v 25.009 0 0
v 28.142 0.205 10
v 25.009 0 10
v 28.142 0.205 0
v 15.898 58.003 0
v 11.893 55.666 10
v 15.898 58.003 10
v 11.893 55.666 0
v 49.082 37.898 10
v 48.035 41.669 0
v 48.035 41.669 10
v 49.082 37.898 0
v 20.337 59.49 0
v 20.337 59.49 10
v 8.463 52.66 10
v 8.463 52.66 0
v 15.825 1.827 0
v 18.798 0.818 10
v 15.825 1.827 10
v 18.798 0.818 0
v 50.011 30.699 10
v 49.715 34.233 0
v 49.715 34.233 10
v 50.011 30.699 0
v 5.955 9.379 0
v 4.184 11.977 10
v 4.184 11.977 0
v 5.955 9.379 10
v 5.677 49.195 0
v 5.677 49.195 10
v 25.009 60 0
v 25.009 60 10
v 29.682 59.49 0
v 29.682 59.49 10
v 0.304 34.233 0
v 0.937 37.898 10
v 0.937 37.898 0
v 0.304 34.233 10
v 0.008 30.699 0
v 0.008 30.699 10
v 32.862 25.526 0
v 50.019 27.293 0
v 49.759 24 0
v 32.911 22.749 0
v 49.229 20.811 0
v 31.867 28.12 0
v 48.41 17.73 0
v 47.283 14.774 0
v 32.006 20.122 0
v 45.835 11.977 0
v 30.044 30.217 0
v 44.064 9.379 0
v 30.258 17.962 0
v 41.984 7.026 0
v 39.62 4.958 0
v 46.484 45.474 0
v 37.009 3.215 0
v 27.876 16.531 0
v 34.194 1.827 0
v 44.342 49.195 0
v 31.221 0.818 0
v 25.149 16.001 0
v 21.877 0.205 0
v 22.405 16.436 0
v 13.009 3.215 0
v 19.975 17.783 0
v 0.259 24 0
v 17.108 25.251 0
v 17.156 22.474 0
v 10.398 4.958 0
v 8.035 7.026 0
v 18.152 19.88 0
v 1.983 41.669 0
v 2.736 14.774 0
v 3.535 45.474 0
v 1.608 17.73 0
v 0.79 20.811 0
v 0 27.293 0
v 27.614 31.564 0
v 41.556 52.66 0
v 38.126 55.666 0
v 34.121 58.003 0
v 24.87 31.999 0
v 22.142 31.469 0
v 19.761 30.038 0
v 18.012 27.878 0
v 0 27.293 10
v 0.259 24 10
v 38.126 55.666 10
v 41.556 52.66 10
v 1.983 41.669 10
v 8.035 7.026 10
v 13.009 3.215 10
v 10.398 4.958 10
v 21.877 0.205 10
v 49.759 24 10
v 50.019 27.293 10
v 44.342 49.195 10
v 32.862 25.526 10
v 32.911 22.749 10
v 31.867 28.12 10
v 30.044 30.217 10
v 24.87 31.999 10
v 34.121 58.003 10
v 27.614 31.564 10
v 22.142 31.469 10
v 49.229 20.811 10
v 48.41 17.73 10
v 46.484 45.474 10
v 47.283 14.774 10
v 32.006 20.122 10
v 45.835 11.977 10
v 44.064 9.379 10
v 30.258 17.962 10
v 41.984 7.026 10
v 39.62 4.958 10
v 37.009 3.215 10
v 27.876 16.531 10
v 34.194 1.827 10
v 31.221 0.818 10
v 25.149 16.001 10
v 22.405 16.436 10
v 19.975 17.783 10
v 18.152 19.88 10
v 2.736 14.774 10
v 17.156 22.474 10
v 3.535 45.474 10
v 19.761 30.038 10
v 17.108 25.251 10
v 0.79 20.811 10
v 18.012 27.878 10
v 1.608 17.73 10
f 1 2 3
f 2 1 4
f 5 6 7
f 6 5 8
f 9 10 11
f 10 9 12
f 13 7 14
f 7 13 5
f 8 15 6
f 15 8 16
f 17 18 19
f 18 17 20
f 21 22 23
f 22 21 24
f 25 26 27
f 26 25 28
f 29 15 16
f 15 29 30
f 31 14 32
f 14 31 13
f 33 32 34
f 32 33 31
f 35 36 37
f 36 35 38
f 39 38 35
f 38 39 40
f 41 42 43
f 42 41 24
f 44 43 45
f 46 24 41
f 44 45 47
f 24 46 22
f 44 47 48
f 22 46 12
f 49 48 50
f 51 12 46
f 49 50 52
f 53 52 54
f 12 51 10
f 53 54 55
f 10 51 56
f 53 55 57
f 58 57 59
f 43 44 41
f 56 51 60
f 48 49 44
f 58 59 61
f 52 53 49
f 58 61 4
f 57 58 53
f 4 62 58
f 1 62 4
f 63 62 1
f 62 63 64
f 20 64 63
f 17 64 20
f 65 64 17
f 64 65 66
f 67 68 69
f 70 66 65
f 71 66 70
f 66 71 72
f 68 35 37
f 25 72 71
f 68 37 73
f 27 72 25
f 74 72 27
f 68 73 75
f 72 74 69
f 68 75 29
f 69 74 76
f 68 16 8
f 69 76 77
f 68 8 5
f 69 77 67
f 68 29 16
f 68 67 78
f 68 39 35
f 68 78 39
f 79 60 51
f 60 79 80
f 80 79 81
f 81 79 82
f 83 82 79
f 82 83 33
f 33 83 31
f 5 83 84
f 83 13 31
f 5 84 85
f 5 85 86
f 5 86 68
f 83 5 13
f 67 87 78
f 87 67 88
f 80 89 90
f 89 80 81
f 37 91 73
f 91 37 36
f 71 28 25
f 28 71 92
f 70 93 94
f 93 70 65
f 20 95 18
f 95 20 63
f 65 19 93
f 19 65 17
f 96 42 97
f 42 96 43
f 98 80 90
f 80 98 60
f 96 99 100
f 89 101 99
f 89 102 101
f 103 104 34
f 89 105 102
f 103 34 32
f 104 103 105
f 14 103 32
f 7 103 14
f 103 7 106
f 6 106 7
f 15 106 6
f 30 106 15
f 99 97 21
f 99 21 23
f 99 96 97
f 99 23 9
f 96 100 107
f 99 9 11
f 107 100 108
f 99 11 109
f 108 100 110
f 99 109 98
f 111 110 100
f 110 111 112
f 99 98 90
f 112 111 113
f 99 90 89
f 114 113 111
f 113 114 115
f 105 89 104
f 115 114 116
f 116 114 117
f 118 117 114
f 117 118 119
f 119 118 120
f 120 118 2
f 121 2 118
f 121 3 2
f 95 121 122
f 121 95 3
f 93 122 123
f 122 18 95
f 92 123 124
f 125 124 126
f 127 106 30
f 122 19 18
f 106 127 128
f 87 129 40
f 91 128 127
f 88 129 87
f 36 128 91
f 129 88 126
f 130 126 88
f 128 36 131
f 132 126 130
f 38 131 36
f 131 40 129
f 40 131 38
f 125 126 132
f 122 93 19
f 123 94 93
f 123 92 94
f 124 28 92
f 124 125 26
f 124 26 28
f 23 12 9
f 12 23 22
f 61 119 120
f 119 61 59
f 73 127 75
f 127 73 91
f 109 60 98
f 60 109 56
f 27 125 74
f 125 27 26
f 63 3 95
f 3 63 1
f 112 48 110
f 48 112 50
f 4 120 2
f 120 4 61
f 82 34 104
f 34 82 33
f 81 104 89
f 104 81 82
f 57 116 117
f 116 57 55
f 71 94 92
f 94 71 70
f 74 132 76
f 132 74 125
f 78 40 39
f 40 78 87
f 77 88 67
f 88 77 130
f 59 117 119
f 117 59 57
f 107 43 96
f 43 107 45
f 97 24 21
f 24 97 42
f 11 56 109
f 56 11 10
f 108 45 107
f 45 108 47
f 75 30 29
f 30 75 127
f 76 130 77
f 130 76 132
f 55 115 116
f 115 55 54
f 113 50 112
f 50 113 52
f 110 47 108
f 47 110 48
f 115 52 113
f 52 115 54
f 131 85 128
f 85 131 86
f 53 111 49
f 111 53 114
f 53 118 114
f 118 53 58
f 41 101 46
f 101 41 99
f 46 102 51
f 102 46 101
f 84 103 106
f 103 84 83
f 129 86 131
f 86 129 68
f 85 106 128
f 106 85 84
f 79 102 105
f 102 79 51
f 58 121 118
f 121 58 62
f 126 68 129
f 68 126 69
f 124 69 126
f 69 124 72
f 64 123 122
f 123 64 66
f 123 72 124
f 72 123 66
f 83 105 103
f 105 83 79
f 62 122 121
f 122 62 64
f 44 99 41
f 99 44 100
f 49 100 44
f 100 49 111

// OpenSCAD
$fn = 32;

// ----------------------------------------------------------------------
// Cam plate: single_lobe cam, base R24
// ----------------------------------------------------------------------

// --- parameters (mm) ---
base_r = 24;              // base circle radius
lobe_h = 12;              // cam lobe rise
bore_r = 8;               // shaft bore radius
plate_t = 10;             // plate thickness, Z (extrusion height)

profile = [[49.759, 24], [50.019, 27.293], [50.011, 30.699], [49.715, 34.233], [49.082, 37.898], [48.035, 41.669], [46.484, 45.474], [44.342, 49.195], [41.556, 52.66], [38.126, 55.666], [34.121, 58.003], [29.682, 59.49], [25.009, 60], [20.337, 59.49], [15.898, 58.003], [11.893, 55.666], [8.463, 52.66], [5.677, 49.195], [3.535, 45.474], [1.983, 41.669], [0.937, 37.898], [0.304, 34.233], [0.008, 30.699], [0, 27.293], [0.259, 24], [0.79, 20.811], [1.608, 17.73], [2.736, 14.774], [4.184, 11.977], [5.955, 9.379], [8.035, 7.026], [10.398, 4.958], [13.009, 3.215], [15.825, 1.827], [18.798, 0.818], [21.877, 0.205], [25.009, 0], [28.142, 0.205], [31.221, 0.818], [34.194, 1.827], [37.009, 3.215], [39.62, 4.958], [41.984, 7.026], [44.064, 9.379], [45.835, 11.977], [47.283, 14.774], [48.41, 17.73], [49.229, 20.811]];  // primary outline, 48 points, counter clockwise
void_1 = [[32.862, 25.526], [31.867, 28.12], [30.044, 30.217], [27.614, 31.564], [24.87, 31.999], [22.142, 31.469], [19.761, 30.038], [18.012, 27.878], [17.108, 25.251], [17.156, 22.474], [18.152, 19.88], [19.975, 17.783], [22.405, 16.436], [25.149, 16.001], [27.876, 16.531], [30.258, 17.962], [32.006, 20.122], [32.911, 22.749]];  // shaft bore, 18 points

// --- the one profile operation ---
difference() {
  linear_extrude(height = plate_t) polygon(points = profile);
  translate([0, 0, -1])
    linear_extrude(height = plate_t + 2) polygon(points = void_1);
}
